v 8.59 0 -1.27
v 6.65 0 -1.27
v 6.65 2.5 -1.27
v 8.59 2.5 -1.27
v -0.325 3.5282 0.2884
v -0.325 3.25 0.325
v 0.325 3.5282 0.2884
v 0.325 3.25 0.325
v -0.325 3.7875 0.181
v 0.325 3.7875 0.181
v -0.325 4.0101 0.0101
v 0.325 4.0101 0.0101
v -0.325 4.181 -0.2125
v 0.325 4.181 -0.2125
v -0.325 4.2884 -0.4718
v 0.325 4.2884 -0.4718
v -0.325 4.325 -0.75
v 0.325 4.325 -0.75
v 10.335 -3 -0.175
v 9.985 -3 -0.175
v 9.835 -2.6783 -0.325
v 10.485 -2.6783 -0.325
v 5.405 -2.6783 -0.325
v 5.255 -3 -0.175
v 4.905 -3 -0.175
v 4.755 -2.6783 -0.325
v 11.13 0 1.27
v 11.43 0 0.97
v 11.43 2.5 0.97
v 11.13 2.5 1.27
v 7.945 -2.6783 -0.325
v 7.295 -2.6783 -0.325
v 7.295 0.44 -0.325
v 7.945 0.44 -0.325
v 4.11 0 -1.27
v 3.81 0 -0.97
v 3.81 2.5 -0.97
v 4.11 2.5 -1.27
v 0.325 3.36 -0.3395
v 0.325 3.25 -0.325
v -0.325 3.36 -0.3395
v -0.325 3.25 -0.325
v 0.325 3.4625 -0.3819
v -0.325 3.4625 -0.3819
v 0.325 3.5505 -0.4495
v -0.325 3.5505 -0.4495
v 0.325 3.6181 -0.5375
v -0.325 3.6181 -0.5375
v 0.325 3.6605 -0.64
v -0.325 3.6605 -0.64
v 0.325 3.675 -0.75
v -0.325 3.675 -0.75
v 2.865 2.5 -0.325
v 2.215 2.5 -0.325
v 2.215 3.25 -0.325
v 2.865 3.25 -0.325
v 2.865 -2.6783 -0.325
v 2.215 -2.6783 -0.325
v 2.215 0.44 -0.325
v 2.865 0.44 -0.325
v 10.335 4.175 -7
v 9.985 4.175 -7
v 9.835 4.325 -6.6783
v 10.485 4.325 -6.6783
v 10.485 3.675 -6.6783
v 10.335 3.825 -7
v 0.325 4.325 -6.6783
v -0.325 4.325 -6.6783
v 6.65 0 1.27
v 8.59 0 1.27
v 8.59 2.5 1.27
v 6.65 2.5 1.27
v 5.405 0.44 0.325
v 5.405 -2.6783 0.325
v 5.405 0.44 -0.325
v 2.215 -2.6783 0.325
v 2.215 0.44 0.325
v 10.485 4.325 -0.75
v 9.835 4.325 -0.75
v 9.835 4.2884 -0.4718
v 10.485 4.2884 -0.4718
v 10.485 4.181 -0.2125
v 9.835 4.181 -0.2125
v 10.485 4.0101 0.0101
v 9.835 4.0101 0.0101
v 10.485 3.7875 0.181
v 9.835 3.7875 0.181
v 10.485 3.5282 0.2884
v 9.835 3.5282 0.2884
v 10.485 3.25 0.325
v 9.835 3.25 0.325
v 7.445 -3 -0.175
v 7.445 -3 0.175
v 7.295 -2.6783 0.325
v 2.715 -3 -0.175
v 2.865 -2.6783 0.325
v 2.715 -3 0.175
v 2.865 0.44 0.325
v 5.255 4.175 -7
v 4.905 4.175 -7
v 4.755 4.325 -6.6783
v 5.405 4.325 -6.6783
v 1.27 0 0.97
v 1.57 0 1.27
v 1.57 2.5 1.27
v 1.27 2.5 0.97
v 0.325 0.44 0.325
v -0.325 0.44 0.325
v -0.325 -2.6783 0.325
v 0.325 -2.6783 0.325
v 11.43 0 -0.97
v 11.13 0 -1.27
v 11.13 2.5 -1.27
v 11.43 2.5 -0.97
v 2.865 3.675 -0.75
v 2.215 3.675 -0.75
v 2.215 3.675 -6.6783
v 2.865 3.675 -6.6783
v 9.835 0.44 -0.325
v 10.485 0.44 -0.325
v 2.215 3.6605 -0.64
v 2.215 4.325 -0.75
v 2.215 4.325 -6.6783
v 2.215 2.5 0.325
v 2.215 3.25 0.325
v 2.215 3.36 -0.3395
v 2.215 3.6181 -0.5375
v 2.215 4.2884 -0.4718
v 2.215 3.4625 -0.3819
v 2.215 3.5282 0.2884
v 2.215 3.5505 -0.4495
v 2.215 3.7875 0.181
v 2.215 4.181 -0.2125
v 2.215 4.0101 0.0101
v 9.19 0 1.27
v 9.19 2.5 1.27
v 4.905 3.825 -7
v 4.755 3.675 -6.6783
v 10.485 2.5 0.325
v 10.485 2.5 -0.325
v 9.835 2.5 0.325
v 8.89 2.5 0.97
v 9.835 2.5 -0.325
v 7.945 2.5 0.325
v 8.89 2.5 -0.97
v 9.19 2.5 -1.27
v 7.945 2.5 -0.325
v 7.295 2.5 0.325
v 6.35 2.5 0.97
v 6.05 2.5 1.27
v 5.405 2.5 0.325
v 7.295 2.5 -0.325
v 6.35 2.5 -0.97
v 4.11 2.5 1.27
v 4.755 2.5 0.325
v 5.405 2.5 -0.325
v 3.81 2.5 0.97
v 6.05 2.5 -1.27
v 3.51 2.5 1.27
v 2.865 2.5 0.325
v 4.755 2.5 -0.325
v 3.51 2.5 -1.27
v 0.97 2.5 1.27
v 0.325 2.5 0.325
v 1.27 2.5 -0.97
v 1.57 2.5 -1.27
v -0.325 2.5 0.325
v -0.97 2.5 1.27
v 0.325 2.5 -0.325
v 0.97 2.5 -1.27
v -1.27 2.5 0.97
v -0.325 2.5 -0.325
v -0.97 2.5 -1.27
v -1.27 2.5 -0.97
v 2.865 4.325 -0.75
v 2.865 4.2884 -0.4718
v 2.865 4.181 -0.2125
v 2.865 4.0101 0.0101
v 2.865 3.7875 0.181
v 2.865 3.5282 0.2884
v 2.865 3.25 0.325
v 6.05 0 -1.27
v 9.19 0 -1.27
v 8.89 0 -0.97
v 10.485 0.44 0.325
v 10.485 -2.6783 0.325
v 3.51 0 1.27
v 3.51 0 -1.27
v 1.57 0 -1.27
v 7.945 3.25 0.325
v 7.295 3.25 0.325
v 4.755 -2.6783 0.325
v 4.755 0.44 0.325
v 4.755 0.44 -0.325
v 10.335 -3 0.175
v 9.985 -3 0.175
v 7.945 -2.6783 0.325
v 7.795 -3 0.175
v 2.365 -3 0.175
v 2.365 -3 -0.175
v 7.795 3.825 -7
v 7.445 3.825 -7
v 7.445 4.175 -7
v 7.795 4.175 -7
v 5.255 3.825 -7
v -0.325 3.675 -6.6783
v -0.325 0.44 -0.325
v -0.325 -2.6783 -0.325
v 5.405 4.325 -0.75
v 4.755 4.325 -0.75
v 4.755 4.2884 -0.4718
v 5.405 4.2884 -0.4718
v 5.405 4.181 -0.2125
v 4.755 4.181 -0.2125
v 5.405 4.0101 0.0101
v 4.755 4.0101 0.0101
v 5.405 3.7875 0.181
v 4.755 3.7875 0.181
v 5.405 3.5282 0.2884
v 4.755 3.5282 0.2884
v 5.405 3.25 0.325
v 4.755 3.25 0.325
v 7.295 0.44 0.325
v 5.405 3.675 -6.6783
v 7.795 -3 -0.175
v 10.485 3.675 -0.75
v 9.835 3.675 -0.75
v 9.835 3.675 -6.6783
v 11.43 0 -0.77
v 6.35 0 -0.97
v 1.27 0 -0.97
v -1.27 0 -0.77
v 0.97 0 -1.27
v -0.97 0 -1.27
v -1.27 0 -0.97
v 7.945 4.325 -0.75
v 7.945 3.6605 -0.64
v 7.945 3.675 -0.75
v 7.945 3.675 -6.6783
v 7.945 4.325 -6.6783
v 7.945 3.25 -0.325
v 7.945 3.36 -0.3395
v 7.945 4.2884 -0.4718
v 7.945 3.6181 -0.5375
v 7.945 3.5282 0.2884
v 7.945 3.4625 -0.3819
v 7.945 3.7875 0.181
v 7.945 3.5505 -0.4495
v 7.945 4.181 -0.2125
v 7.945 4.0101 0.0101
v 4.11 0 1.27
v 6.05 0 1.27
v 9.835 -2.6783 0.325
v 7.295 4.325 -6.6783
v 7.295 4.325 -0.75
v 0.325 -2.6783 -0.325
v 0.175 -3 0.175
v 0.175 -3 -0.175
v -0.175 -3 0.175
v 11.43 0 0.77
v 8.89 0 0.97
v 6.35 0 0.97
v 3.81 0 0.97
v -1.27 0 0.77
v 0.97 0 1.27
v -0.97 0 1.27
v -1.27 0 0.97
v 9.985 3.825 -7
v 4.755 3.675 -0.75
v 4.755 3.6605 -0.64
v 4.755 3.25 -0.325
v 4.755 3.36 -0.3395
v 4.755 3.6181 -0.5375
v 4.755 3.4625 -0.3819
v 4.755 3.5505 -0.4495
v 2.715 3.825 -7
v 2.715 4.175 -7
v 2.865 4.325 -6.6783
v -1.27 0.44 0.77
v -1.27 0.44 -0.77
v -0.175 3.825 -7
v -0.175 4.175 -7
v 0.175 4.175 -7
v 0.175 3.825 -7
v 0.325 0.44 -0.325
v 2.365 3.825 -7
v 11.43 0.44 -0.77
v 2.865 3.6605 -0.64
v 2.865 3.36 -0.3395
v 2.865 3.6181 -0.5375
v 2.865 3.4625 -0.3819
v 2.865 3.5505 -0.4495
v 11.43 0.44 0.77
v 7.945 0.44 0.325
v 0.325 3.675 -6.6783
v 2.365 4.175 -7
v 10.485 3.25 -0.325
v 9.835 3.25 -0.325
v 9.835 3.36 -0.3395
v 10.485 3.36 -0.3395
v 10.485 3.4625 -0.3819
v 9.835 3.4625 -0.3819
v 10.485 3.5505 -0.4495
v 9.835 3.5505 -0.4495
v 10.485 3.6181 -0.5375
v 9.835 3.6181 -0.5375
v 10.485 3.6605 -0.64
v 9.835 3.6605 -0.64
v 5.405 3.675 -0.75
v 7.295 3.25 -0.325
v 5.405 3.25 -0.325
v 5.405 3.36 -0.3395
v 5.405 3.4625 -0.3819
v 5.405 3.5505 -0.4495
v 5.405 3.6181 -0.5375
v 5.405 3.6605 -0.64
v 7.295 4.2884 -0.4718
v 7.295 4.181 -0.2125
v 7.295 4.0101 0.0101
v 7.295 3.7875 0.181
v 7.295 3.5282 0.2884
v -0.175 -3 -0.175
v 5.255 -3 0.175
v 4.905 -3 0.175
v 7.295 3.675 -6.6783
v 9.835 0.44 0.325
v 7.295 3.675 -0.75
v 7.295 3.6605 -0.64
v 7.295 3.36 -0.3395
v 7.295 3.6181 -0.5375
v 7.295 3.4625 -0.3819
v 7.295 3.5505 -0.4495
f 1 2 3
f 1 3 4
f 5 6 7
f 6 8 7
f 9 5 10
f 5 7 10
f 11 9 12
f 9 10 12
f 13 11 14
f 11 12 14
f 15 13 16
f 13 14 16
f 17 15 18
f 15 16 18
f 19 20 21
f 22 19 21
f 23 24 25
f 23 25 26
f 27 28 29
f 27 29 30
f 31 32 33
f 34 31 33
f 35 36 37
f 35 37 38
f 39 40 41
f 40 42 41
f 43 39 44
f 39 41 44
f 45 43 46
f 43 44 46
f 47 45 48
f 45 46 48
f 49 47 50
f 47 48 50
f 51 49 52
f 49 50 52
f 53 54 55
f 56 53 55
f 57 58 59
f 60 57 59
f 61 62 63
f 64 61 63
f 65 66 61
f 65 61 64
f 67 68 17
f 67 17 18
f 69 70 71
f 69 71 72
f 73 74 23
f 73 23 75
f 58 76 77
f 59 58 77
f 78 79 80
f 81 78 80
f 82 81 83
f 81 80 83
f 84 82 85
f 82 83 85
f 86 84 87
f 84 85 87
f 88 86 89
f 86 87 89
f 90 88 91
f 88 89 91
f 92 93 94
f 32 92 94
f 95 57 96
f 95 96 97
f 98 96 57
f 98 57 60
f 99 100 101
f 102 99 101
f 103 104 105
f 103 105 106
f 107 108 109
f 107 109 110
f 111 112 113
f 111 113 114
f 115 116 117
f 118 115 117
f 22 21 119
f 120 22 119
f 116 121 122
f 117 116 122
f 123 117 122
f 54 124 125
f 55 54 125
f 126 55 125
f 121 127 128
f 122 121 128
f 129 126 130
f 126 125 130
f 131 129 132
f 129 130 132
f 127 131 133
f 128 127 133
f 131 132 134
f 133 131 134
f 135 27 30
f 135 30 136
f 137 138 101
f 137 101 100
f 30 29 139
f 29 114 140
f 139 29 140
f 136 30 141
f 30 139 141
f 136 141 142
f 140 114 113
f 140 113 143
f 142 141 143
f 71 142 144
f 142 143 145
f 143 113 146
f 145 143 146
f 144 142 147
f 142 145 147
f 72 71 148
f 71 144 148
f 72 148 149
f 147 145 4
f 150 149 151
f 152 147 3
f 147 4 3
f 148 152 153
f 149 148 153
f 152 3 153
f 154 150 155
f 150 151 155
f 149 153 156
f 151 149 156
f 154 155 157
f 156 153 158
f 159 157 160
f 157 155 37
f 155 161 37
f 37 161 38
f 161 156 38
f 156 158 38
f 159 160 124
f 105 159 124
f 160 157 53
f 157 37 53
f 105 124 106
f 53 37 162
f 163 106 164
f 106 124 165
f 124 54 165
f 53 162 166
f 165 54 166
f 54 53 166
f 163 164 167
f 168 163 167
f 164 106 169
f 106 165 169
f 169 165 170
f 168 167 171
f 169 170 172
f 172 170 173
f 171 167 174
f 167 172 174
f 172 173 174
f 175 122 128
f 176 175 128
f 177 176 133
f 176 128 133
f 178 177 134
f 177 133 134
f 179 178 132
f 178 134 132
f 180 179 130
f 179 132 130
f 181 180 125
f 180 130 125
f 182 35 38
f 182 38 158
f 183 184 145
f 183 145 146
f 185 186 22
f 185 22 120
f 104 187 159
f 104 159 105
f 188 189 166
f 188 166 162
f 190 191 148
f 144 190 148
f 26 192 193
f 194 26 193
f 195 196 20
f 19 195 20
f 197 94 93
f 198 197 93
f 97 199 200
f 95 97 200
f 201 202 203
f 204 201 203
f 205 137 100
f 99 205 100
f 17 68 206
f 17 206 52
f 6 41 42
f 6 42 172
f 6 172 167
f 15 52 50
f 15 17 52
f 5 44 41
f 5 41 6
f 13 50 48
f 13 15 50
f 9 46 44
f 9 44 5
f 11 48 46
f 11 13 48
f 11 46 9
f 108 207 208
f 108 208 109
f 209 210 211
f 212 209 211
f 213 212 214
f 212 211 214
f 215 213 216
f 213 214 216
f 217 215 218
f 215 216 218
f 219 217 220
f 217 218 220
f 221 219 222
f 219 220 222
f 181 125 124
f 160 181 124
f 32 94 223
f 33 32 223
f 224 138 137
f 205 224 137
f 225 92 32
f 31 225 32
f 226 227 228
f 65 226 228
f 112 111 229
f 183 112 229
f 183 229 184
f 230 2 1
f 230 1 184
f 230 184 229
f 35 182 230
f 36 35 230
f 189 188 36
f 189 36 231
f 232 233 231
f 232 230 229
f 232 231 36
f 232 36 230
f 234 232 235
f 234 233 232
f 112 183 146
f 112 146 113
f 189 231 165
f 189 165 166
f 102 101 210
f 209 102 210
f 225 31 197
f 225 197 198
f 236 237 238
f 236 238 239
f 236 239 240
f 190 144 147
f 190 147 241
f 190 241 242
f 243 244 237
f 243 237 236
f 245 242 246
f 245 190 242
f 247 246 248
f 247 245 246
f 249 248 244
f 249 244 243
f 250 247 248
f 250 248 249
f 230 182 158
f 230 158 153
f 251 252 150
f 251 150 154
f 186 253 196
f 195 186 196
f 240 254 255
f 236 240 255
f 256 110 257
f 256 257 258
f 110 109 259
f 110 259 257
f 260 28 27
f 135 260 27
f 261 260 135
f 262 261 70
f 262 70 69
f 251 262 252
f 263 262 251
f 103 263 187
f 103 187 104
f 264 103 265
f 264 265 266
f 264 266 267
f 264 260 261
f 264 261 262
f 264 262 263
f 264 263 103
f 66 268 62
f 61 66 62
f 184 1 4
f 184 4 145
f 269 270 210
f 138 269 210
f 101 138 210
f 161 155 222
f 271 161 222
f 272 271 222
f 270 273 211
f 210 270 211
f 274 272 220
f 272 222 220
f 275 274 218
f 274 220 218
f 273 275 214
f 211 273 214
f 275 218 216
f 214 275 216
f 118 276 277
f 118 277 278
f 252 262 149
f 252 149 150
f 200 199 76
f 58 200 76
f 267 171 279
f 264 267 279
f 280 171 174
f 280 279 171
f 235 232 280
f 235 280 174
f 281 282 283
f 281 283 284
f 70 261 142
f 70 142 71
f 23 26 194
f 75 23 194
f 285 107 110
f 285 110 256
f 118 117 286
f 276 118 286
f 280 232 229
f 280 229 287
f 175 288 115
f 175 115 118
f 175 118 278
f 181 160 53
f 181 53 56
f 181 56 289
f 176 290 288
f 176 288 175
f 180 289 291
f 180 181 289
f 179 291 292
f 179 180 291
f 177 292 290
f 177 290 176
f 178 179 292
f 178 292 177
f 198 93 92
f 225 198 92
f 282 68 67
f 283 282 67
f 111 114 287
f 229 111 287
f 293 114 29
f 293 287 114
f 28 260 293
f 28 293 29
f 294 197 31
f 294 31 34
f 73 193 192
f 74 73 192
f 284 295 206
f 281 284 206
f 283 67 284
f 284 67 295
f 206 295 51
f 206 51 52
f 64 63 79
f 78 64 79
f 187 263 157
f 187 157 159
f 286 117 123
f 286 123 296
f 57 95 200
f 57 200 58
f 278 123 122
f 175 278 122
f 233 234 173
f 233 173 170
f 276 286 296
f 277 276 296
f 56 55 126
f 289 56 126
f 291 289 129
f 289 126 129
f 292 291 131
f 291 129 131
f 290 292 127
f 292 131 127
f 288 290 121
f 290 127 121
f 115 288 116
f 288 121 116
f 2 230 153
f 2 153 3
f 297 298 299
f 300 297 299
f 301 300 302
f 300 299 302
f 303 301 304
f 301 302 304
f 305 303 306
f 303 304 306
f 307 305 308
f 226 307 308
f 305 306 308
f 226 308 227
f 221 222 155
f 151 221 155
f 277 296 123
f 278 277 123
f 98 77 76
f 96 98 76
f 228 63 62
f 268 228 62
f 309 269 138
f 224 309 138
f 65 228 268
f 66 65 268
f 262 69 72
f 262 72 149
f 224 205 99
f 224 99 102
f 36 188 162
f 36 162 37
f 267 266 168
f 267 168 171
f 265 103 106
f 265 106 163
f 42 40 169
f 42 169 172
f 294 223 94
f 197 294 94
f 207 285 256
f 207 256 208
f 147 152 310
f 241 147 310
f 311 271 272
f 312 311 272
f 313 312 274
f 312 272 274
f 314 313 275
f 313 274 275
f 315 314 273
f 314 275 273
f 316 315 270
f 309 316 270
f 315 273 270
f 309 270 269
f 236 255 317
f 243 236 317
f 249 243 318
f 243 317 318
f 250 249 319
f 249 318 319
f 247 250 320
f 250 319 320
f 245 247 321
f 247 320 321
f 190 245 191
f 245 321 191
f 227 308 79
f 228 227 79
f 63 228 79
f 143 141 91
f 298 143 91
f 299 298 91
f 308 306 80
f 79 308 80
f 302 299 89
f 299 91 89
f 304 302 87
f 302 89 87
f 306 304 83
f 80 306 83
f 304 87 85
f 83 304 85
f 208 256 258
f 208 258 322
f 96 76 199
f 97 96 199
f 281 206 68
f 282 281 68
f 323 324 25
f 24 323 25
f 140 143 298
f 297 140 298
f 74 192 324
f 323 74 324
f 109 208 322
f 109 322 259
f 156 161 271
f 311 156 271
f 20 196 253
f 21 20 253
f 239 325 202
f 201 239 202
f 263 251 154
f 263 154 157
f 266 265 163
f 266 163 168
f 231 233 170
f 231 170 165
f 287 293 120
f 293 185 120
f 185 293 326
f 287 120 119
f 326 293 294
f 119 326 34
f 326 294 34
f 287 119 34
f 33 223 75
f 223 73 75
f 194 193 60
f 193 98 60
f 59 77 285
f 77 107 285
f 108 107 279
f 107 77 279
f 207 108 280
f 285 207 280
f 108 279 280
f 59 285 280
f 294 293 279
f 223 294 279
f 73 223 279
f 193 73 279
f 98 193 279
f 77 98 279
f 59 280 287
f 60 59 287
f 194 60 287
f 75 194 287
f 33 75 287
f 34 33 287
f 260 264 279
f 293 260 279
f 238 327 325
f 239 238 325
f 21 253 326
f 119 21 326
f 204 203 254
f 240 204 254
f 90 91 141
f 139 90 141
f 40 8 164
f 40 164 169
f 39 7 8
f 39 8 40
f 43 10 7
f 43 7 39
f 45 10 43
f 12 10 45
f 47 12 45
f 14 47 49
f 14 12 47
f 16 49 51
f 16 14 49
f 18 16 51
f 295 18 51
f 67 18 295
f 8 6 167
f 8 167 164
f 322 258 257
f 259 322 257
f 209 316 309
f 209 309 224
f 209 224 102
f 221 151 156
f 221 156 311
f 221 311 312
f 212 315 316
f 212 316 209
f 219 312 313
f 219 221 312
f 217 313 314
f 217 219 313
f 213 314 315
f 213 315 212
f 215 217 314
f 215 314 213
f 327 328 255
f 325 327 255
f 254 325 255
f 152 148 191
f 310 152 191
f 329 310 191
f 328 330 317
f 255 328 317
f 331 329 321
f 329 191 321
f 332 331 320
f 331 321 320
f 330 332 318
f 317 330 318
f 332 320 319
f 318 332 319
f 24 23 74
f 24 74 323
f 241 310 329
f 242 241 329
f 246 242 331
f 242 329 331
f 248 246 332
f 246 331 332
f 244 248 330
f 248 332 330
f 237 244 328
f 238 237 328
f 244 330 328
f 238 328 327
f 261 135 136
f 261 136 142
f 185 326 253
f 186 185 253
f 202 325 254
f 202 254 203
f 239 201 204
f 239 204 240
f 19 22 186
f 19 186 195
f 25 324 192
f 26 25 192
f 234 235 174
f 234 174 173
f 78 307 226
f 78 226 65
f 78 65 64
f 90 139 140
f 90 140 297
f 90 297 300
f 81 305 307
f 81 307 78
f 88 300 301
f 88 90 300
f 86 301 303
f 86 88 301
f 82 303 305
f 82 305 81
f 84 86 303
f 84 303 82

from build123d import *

# Parameters (mm, degrees)
BASE_DEPTH          = 2.5
BASE_PATTERN_COUNT  = 5
BASE_PATTERN_PITCH  = 2.54
CUT_DEPTH           = 12.768933682
CUT_DEPTH_BACK      = 12.768933682
SKETCH2_W           = 1.54
SKETCH2_H           = 0.44
SKETCH3_W           = 0.65
SKETCH3_H           = 0.65
PIN_CHAMFER_SIZE    = 0.15
PIN_CHAMFER_SIZE2   = 0.321676038
CHAMFER1_SIZE       = 0.15
CHAMFER1_SIZE2      = 0.321676038
PIN_START           = 2.215
PIN_PATTERN_DEPTH   = 0.65
PIN_START_2         = 4.755
PIN_PATTERN_2_DEPTH = 0.65
PIN_START_3         = 7.295
PIN_PATTERN_3_DEPTH = 0.65
PIN_START_4         = 9.835
PIN_PATTERN_4_DEPTH = 0.65
PIN_START_5         = -6.678323962
PIN_PATTERN_5_DEPTH = 7.678323962
PIN_START_6         = 2.5
PIN_PATTERN_6_DEPTH = 2.5


with BuildPart() as part:
    # Sketch1 → Base (new body)
    with BuildSketch(Plane(origin=(0, 0, 0), x_dir=(1, 0, 0), z_dir=(0, 1, 0))):
        Polygon((-1.27, 0.97), (-0.97, 1.27), (0.97, 1.27), (1.27, 0.97), (1.27, -0.97), (0.97, -1.27), (-0.97, -1.27), (-1.27, -0.97), align=None)
    base = extrude(amount=BASE_DEPTH)

    # Base_Pattern: Base ×5
    with Locations(*[(i * BASE_PATTERN_PITCH, 0, 0) for i in range(1, BASE_PATTERN_COUNT)]):
        add(base)

    # Sketch2 → Cut (cut, two sides: drawn at the far end of the back side and taken through both)
    with BuildSketch(Plane(origin=(0, 0, 0), x_dir=(0, 0, -1), z_dir=(1, 0, 0)).offset(-CUT_DEPTH_BACK)):
        with Locations((0, 0.22)):
            Rectangle(SKETCH2_W, SKETCH2_H)
    extrude(amount=CUT_DEPTH + CUT_DEPTH_BACK, mode=Mode.SUBTRACT)

    # Sweep1: sweep along a path in Sketch4
    with BuildLine(Plane(origin=(0, 0, 0), x_dir=(0, 0, -1), z_dir=(1, 0, 0))) as sweep1_path:
        Line((0, -3), (0, 3.25))
        ThreePointArc((0, 3.25), (0.219669914, 3.780330086), (0.75, 4))
        Line((0.75, 4), (7, 4))
    # Sketch3 → Sweep1 (sweep)
    with BuildSketch(Plane(origin=(0, -3, 0), x_dir=(1, 0, 0), z_dir=(0, 1, 0))):
        Rectangle(SKETCH3_W, SKETCH3_H)
    sweep(path=sweep1_path.line)

    # Pin Chamfer
    pin_chamfer_edges = [part.edges().sort_by_distance(p)[0] for p in [
        (0.325, -3, 0),
        (0, -3, -0.325),
        (-0.325, -3, 0),
        (0, -3, 0.325),
    ]]
    pin_chamfer_side = [part.faces().sort_by_distance(p)[0] for p in [
        (0, -3, 0),
    ]]
    chamfer(pin_chamfer_edges, length=PIN_CHAMFER_SIZE, length2=PIN_CHAMFER_SIZE2, reference=pin_chamfer_side[0])

    # Chamfer1
    chamfer1_edges = [part.edges().sort_by_distance(p)[0] for p in [
        (-0.325, 4, -7),
        (0, 4.325, -7),
        (0.325, 4, -7),
        (0, 3.675, -7),
    ]]
    chamfer1_side = [part.faces().sort_by_distance(p)[0] for p in [
        (0, 4, -7),
    ]]
    chamfer(chamfer1_edges, length=CHAMFER1_SIZE, length2=CHAMFER1_SIZE2, reference=chamfer1_side[0])

    # Pin Pattern: read off the stored shape, not the designer's step
    # Pin Pattern outline → Pin Pattern (add)
    with BuildSketch(Plane.YZ.offset(PIN_START)):
        Polygon((-2.678323962, 0.325), (-3, 0.175), (-3, -0.175), (-2.678323962, -0.325), (0.44, -0.325), (0.44, 0.325), align=None)
        with BuildLine():
            Line((2.5, -0.325), (3.25, -0.325))
            ThreePointArc((3.25, -0.325), (3.550520382, -0.449479618), (3.675, -0.75))
            Line((3.675, -0.75), (3.675, -6.678323962))
            Line((3.675, -6.678323962), (3.825, -7))
            Line((3.825, -7), (4.175, -7))
            Line((4.175, -7), (4.325, -6.678323962))
            Line((4.325, -6.678323962), (4.325, -0.75))
            ThreePointArc((4.325, -0.75), (4.01013979, 0.01013979), (3.25, 0.325))
            Line((3.25, 0.325), (2.5, 0.325))
            Line((2.5, 0.325), (2.5, -0.325))
        make_face()
    extrude(amount=PIN_PATTERN_DEPTH)

    # Pin Pattern 2 outline → Pin Pattern 2 (add)
    with BuildSketch(Plane.YZ.offset(PIN_START_2)):
        Polygon((-2.678323962, 0.325), (-3, 0.175), (-3, -0.175), (-2.678323962, -0.325), (0.44, -0.325), (0.44, 0.325), align=None)
        with BuildLine():
            Line((2.5, -0.325), (3.25, -0.325))
            ThreePointArc((3.25, -0.325), (3.550520382, -0.449479618), (3.675, -0.75))
            Line((3.675, -0.75), (3.675, -6.678323962))
            Line((3.675, -6.678323962), (3.825, -7))
            Line((3.825, -7), (4.175, -7))
            Line((4.175, -7), (4.325, -6.678323962))
            Line((4.325, -6.678323962), (4.325, -0.75))
            ThreePointArc((4.325, -0.75), (4.01013979, 0.01013979), (3.25, 0.325))
            Line((3.25, 0.325), (2.5, 0.325))
            Line((2.5, 0.325), (2.5, -0.325))
        make_face()
    extrude(amount=PIN_PATTERN_2_DEPTH)

    # Pin Pattern 3 outline → Pin Pattern 3 (add)
    with BuildSketch(Plane.YZ.offset(PIN_START_3)):
        Polygon((-2.678323962, 0.325), (-3, 0.175), (-3, -0.175), (-2.678323962, -0.325), (0.44, -0.325), (0.44, 0.325), align=None)
        with BuildLine():
            Line((2.5, -0.325), (3.25, -0.325))
            ThreePointArc((3.25, -0.325), (3.550520382, -0.449479618), (3.675, -0.75))
            Line((3.675, -0.75), (3.675, -6.678323962))
            Line((3.675, -6.678323962), (3.825, -7))
            Line((3.825, -7), (4.175, -7))
            Line((4.175, -7), (4.325, -6.678323962))
            Line((4.325, -6.678323962), (4.325, -0.75))
            ThreePointArc((4.325, -0.75), (4.01013979, 0.01013979), (3.25, 0.325))
            Line((3.25, 0.325), (2.5, 0.325))
            Line((2.5, 0.325), (2.5, -0.325))
        make_face()
    extrude(amount=PIN_PATTERN_3_DEPTH)

    # Pin Pattern 4 outline → Pin Pattern 4 (add)
    with BuildSketch(Plane.YZ.offset(PIN_START_4)):
        Polygon((-2.678323962, 0.325), (-3, 0.175), (-3, -0.175), (-2.678323962, -0.325), (0.44, -0.325), (0.44, 0.325), align=None)
        with BuildLine():
            Line((2.5, -0.325), (3.25, -0.325))
            ThreePointArc((3.25, -0.325), (3.550520382, -0.449479618), (3.675, -0.75))
            Line((3.675, -0.75), (3.675, -6.678323962))
            Line((3.675, -6.678323962), (3.825, -7))
            Line((3.825, -7), (4.175, -7))
            Line((4.175, -7), (4.325, -6.678323962))
            Line((4.325, -6.678323962), (4.325, -0.75))
            ThreePointArc((4.325, -0.75), (4.01013979, 0.01013979), (3.25, 0.325))
            Line((3.25, 0.325), (2.5, 0.325))
            Line((2.5, 0.325), (2.5, -0.325))
        make_face()
    extrude(amount=PIN_PATTERN_4_DEPTH)

    # Pin Pattern 5 outline → Pin Pattern 5 (cut)
    with BuildSketch(Plane.XY.offset(PIN_START_5)):
        Polygon((2.865, -2.678323962), (2.715, -3), (2.865, -3), align=None)
        Polygon((2.365, -3), (2.215, -2.678323962), (2.215, -3), align=None)
        Polygon((5.405, -2.678323962), (5.255, -3), (5.405, -3), align=None)
        Polygon((4.905, -3), (4.755, -2.678323962), (4.755, -3), align=None)
        Polygon((7.945, -2.678323962), (7.795, -3), (7.945, -3), align=None)
        Polygon((7.445, -3), (7.295, -2.678323962), (7.295, -3), align=None)
        Polygon((10.485, -2.678323962), (10.335, -3), (10.485, -3), align=None)
        Polygon((9.985, -3), (9.835, -2.678323962), (9.835, -3), align=None)
    extrude(amount=PIN_PATTERN_5_DEPTH, mode=Mode.SUBTRACT)

    # Pin Pattern 6 outline → Pin Pattern 6 (cut)
    with BuildSketch(Plane(origin=(0, 0, 0), x_dir=(1, 0, 0), z_dir=(0, 1, 0)).offset(PIN_START_6)):
        Polygon((2.865, 7), (2.715, 7), (2.865, 6.678323962), align=None)
        Polygon((2.215, 6.678323962), (2.365, 7), (2.215, 7), align=None)
        Polygon((5.405, 7), (5.255, 7), (5.405, 6.678323962), align=None)
        Polygon((4.755, 6.678323962), (4.905, 7), (4.755, 7), align=None)
        Polygon((7.945, 7), (7.795, 7), (7.945, 6.678323962), align=None)
        Polygon((7.295, 6.678323962), (7.445, 7), (7.295, 7), align=None)
        Polygon((10.485, 7), (10.335, 7), (10.485, 6.678323962), align=None)
        Polygon((9.835, 6.678323962), (9.985, 7), (9.835, 7), align=None)
    extrude(amount=PIN_PATTERN_6_DEPTH, mode=Mode.SUBTRACT)


solid = part.part
